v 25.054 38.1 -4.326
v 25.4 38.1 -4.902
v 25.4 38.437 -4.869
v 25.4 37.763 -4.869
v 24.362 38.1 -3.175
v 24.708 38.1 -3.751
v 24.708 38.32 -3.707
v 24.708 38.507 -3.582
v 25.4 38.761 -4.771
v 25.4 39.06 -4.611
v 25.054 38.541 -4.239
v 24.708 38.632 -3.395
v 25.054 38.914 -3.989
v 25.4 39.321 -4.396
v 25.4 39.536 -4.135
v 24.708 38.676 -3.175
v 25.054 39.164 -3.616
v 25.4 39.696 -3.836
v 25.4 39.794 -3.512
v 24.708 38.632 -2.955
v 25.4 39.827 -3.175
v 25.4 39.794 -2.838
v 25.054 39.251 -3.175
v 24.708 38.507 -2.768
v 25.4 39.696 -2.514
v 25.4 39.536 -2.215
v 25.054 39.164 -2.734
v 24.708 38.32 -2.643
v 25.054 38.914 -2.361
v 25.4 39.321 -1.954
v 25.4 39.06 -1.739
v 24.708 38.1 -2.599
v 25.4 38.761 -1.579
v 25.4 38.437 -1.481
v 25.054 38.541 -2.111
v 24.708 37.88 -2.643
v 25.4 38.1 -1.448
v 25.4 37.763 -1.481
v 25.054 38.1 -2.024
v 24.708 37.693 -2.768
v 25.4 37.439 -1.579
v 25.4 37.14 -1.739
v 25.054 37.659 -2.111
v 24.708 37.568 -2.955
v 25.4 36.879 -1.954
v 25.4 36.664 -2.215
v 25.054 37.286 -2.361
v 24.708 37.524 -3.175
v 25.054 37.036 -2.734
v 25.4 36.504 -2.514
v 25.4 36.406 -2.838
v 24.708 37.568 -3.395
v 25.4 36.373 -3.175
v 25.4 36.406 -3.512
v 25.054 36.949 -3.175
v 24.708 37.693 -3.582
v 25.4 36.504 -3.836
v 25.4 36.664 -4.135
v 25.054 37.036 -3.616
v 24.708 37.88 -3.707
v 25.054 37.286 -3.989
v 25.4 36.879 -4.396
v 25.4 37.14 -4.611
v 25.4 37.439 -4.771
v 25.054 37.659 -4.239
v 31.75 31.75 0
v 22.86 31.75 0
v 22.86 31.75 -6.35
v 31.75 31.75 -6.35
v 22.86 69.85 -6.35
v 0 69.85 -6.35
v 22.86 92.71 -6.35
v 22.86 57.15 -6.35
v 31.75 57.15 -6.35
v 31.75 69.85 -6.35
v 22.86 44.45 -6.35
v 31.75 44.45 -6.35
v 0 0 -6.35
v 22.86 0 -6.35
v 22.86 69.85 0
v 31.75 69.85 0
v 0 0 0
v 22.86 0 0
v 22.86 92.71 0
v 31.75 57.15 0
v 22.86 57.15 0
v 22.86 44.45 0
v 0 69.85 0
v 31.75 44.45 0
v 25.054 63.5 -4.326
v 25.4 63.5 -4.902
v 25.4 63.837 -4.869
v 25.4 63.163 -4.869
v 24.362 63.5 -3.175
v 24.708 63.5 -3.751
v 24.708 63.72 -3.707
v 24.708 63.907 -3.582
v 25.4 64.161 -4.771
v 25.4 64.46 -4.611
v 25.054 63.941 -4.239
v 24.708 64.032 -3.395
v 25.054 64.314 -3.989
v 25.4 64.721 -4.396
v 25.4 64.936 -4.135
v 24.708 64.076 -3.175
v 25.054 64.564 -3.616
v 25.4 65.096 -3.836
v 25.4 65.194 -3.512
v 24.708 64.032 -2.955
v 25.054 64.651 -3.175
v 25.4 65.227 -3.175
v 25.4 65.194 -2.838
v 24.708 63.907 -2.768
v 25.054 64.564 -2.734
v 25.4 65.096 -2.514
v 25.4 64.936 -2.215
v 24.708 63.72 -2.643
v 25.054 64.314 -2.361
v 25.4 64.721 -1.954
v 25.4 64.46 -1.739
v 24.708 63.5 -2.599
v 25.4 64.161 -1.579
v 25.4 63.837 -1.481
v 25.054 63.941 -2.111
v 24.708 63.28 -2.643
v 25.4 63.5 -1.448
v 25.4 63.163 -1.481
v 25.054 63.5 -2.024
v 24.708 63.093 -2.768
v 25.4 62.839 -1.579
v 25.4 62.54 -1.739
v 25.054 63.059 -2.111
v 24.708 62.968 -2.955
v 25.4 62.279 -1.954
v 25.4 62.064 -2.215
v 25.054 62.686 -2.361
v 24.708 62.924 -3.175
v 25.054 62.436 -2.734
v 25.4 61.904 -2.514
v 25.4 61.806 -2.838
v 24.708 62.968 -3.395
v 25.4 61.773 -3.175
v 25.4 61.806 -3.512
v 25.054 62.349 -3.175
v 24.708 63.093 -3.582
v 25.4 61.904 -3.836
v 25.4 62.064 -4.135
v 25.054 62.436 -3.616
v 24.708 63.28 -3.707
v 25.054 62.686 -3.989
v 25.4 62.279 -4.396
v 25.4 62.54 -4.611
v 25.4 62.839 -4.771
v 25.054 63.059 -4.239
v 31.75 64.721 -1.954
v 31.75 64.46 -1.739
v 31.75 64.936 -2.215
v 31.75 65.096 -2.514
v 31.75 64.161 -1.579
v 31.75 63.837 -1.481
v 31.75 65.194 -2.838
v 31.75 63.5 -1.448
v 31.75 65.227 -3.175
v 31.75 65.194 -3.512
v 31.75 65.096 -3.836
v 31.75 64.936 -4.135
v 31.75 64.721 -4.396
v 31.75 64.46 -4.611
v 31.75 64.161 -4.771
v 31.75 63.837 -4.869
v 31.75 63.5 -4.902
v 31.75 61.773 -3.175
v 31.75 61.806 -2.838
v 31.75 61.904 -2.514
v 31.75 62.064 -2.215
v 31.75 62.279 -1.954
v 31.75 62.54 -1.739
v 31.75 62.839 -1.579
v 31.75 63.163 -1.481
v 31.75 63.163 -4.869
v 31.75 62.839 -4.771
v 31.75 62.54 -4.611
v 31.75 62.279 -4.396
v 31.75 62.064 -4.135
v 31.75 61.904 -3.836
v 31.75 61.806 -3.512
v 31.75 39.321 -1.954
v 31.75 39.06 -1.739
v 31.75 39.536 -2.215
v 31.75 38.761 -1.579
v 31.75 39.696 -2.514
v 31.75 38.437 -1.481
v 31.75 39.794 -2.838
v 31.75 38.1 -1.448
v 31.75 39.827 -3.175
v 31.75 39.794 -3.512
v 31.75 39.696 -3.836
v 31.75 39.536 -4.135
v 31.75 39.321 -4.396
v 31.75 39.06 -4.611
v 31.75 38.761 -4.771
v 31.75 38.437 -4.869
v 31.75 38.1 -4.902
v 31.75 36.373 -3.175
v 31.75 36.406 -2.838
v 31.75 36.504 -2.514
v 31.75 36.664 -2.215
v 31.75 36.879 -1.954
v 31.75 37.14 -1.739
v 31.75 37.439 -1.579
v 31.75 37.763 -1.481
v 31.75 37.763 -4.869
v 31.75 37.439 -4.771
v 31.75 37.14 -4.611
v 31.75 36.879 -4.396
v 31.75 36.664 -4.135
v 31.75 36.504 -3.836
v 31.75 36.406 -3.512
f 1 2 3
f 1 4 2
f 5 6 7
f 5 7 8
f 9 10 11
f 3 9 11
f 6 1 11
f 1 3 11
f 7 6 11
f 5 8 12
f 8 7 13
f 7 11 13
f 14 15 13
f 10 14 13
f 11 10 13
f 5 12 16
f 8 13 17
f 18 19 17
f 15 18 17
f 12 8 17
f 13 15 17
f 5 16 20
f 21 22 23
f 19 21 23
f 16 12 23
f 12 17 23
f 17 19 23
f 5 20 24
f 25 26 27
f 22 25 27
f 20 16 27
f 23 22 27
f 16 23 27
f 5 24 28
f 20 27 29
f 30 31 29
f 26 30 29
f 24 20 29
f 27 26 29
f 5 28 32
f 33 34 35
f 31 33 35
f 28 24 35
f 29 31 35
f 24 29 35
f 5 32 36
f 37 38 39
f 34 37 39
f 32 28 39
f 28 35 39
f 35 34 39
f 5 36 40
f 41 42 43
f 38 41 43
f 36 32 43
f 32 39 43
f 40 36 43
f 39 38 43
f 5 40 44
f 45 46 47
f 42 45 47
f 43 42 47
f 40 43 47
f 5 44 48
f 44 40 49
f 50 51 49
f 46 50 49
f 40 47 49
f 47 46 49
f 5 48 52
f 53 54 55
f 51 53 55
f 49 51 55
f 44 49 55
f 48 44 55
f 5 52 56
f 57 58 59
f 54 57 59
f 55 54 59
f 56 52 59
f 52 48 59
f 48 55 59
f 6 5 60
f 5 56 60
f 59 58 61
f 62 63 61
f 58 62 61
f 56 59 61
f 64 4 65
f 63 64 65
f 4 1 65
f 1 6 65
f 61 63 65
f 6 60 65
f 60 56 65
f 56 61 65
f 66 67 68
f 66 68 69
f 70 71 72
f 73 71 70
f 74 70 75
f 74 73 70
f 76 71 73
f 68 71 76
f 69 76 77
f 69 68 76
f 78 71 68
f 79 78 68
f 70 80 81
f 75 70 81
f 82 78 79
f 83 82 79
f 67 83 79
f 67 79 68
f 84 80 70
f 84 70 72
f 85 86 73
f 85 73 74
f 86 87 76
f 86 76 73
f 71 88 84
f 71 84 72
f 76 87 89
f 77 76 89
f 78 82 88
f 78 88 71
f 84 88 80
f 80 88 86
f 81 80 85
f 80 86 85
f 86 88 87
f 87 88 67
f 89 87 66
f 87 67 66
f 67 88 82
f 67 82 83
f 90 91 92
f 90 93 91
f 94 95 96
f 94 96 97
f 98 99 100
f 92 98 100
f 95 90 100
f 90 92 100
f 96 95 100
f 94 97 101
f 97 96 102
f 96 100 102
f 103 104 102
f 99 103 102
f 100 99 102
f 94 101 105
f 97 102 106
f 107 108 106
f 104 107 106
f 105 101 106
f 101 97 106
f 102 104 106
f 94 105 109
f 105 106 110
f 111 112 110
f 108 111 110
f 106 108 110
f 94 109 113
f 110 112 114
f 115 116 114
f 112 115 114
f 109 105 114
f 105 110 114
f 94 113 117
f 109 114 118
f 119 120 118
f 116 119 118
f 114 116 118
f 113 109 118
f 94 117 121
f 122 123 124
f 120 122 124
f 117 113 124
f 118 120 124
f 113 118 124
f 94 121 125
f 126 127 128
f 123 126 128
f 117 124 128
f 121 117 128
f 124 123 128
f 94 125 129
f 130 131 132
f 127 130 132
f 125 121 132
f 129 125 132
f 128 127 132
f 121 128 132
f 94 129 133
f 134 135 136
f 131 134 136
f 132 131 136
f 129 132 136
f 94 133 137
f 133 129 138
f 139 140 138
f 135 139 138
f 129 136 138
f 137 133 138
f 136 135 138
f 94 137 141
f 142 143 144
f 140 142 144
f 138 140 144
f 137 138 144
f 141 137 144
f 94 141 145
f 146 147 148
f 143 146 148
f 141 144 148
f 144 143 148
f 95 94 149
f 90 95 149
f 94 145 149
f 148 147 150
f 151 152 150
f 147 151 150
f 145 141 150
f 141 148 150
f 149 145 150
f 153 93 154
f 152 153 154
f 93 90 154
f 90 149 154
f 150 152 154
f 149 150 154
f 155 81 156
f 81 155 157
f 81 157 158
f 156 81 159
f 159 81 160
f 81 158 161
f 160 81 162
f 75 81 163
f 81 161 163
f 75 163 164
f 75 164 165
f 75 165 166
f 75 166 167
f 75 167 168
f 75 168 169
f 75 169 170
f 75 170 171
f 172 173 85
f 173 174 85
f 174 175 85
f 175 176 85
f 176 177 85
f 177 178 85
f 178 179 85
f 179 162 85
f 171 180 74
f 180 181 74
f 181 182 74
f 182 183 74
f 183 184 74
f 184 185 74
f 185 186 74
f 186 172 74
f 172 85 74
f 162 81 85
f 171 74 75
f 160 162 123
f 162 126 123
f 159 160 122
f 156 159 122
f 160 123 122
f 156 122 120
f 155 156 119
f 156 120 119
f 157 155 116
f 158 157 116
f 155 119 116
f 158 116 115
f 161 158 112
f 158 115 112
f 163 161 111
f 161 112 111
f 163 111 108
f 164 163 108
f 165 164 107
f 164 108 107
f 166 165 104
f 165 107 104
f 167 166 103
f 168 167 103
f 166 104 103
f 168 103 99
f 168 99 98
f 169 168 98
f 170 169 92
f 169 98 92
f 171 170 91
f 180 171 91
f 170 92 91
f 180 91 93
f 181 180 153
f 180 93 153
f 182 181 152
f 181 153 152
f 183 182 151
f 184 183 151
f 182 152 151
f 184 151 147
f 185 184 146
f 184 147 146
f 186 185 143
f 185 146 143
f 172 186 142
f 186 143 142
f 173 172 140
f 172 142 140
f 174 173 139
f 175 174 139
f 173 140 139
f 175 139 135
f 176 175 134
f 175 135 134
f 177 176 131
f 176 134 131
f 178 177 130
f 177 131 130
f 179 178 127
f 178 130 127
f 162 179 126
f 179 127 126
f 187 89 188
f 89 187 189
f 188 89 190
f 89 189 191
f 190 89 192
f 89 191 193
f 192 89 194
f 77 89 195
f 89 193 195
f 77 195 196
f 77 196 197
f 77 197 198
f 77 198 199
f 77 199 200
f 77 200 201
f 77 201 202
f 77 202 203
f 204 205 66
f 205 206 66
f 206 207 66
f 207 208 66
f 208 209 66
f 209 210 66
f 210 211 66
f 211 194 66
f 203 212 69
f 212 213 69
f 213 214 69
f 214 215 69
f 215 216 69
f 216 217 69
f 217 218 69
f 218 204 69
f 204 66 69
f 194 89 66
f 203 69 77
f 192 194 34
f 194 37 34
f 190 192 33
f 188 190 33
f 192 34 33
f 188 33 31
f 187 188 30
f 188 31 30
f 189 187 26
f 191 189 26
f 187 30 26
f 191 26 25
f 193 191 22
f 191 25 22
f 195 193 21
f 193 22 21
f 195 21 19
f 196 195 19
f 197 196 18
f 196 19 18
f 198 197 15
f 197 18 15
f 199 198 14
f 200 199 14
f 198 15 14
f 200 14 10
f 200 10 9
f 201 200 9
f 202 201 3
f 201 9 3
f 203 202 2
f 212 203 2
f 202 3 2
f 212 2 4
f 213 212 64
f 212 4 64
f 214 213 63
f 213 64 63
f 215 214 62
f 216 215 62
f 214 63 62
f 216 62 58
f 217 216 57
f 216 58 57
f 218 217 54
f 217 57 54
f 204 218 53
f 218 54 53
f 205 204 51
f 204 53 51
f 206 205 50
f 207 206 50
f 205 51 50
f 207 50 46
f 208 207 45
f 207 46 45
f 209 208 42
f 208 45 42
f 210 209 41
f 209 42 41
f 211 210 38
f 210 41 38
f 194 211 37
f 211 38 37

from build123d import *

# Parameters (mm, degrees)
SKETCH1_W                 = 31.75
SKETCH1_H                 = 6.35
BOSS_EXTRUDE1_DEPTH       = 101.6
CHAMFER1_SIZE             = 31.75
F_8_32_TAPPED_HOLE1_D     = 3.4544
F_8_32_TAPPED_HOLE1_DEPTH = 6.35
F_8_32_TAPPED_HOLE1_TIP   = 1.037806461
SKETCH4_W                 = 8.89
SKETCH4_H                 = 31.75
SKETCH4_H_2               = 12.7
CUT_EXTRUDE1_DEPTH        = 107.634633211


with BuildPart() as part:
    # Sketch1 → Boss-Extrude1 (new body)
    with BuildSketch(Plane(origin=(0, 0, 0), x_dir=(1, 0, 0), z_dir=(0, 1, 0))):
        with Locations((15.875, 3.175)):
            Rectangle(SKETCH1_W, SKETCH1_H)
    extrude(amount=BOSS_EXTRUDE1_DEPTH)

    # Chamfer1
    chamfer1_edges = [part.edges().sort_by_distance(p)[0] for p in [
        (0, 101.6, -3.175),
    ]]
    chamfer(chamfer1_edges, length=CHAMFER1_SIZE - 0.0001)  # a hair under: the kernel refuses the full size

    # #8-32 Tapped Hole1
    with Locations(Plane(origin=(31.75, 0, 0), x_dir=(0, 0, -1), z_dir=(1, 0, 0))):
        with Locations((3.175, 63.5), (3.175, 38.1)):
            Hole(F_8_32_TAPPED_HOLE1_D / 2, depth=F_8_32_TAPPED_HOLE1_DEPTH)
            with Locations((0, 0, -(F_8_32_TAPPED_HOLE1_DEPTH + F_8_32_TAPPED_HOLE1_TIP / 2))):  # 118° drill point
                Cone(0, F_8_32_TAPPED_HOLE1_D / 2, F_8_32_TAPPED_HOLE1_TIP, mode=Mode.SUBTRACT)

    # Sketch4 → Cut-Extrude1 (cut, through all)
    with BuildSketch(Plane.XY):
        with Locations((27.305, 15.875)):
            Rectangle(SKETCH4_W, SKETCH4_H)
        with Locations((27.305, 50.8)):
            Rectangle(SKETCH4_W, SKETCH4_H_2)
        with Locations((27.305, 85.725)):
            Rectangle(SKETCH4_W, SKETCH4_H)
    extrude(amount=-CUT_EXTRUDE1_DEPTH, mode=Mode.SUBTRACT)


solid = part.part
